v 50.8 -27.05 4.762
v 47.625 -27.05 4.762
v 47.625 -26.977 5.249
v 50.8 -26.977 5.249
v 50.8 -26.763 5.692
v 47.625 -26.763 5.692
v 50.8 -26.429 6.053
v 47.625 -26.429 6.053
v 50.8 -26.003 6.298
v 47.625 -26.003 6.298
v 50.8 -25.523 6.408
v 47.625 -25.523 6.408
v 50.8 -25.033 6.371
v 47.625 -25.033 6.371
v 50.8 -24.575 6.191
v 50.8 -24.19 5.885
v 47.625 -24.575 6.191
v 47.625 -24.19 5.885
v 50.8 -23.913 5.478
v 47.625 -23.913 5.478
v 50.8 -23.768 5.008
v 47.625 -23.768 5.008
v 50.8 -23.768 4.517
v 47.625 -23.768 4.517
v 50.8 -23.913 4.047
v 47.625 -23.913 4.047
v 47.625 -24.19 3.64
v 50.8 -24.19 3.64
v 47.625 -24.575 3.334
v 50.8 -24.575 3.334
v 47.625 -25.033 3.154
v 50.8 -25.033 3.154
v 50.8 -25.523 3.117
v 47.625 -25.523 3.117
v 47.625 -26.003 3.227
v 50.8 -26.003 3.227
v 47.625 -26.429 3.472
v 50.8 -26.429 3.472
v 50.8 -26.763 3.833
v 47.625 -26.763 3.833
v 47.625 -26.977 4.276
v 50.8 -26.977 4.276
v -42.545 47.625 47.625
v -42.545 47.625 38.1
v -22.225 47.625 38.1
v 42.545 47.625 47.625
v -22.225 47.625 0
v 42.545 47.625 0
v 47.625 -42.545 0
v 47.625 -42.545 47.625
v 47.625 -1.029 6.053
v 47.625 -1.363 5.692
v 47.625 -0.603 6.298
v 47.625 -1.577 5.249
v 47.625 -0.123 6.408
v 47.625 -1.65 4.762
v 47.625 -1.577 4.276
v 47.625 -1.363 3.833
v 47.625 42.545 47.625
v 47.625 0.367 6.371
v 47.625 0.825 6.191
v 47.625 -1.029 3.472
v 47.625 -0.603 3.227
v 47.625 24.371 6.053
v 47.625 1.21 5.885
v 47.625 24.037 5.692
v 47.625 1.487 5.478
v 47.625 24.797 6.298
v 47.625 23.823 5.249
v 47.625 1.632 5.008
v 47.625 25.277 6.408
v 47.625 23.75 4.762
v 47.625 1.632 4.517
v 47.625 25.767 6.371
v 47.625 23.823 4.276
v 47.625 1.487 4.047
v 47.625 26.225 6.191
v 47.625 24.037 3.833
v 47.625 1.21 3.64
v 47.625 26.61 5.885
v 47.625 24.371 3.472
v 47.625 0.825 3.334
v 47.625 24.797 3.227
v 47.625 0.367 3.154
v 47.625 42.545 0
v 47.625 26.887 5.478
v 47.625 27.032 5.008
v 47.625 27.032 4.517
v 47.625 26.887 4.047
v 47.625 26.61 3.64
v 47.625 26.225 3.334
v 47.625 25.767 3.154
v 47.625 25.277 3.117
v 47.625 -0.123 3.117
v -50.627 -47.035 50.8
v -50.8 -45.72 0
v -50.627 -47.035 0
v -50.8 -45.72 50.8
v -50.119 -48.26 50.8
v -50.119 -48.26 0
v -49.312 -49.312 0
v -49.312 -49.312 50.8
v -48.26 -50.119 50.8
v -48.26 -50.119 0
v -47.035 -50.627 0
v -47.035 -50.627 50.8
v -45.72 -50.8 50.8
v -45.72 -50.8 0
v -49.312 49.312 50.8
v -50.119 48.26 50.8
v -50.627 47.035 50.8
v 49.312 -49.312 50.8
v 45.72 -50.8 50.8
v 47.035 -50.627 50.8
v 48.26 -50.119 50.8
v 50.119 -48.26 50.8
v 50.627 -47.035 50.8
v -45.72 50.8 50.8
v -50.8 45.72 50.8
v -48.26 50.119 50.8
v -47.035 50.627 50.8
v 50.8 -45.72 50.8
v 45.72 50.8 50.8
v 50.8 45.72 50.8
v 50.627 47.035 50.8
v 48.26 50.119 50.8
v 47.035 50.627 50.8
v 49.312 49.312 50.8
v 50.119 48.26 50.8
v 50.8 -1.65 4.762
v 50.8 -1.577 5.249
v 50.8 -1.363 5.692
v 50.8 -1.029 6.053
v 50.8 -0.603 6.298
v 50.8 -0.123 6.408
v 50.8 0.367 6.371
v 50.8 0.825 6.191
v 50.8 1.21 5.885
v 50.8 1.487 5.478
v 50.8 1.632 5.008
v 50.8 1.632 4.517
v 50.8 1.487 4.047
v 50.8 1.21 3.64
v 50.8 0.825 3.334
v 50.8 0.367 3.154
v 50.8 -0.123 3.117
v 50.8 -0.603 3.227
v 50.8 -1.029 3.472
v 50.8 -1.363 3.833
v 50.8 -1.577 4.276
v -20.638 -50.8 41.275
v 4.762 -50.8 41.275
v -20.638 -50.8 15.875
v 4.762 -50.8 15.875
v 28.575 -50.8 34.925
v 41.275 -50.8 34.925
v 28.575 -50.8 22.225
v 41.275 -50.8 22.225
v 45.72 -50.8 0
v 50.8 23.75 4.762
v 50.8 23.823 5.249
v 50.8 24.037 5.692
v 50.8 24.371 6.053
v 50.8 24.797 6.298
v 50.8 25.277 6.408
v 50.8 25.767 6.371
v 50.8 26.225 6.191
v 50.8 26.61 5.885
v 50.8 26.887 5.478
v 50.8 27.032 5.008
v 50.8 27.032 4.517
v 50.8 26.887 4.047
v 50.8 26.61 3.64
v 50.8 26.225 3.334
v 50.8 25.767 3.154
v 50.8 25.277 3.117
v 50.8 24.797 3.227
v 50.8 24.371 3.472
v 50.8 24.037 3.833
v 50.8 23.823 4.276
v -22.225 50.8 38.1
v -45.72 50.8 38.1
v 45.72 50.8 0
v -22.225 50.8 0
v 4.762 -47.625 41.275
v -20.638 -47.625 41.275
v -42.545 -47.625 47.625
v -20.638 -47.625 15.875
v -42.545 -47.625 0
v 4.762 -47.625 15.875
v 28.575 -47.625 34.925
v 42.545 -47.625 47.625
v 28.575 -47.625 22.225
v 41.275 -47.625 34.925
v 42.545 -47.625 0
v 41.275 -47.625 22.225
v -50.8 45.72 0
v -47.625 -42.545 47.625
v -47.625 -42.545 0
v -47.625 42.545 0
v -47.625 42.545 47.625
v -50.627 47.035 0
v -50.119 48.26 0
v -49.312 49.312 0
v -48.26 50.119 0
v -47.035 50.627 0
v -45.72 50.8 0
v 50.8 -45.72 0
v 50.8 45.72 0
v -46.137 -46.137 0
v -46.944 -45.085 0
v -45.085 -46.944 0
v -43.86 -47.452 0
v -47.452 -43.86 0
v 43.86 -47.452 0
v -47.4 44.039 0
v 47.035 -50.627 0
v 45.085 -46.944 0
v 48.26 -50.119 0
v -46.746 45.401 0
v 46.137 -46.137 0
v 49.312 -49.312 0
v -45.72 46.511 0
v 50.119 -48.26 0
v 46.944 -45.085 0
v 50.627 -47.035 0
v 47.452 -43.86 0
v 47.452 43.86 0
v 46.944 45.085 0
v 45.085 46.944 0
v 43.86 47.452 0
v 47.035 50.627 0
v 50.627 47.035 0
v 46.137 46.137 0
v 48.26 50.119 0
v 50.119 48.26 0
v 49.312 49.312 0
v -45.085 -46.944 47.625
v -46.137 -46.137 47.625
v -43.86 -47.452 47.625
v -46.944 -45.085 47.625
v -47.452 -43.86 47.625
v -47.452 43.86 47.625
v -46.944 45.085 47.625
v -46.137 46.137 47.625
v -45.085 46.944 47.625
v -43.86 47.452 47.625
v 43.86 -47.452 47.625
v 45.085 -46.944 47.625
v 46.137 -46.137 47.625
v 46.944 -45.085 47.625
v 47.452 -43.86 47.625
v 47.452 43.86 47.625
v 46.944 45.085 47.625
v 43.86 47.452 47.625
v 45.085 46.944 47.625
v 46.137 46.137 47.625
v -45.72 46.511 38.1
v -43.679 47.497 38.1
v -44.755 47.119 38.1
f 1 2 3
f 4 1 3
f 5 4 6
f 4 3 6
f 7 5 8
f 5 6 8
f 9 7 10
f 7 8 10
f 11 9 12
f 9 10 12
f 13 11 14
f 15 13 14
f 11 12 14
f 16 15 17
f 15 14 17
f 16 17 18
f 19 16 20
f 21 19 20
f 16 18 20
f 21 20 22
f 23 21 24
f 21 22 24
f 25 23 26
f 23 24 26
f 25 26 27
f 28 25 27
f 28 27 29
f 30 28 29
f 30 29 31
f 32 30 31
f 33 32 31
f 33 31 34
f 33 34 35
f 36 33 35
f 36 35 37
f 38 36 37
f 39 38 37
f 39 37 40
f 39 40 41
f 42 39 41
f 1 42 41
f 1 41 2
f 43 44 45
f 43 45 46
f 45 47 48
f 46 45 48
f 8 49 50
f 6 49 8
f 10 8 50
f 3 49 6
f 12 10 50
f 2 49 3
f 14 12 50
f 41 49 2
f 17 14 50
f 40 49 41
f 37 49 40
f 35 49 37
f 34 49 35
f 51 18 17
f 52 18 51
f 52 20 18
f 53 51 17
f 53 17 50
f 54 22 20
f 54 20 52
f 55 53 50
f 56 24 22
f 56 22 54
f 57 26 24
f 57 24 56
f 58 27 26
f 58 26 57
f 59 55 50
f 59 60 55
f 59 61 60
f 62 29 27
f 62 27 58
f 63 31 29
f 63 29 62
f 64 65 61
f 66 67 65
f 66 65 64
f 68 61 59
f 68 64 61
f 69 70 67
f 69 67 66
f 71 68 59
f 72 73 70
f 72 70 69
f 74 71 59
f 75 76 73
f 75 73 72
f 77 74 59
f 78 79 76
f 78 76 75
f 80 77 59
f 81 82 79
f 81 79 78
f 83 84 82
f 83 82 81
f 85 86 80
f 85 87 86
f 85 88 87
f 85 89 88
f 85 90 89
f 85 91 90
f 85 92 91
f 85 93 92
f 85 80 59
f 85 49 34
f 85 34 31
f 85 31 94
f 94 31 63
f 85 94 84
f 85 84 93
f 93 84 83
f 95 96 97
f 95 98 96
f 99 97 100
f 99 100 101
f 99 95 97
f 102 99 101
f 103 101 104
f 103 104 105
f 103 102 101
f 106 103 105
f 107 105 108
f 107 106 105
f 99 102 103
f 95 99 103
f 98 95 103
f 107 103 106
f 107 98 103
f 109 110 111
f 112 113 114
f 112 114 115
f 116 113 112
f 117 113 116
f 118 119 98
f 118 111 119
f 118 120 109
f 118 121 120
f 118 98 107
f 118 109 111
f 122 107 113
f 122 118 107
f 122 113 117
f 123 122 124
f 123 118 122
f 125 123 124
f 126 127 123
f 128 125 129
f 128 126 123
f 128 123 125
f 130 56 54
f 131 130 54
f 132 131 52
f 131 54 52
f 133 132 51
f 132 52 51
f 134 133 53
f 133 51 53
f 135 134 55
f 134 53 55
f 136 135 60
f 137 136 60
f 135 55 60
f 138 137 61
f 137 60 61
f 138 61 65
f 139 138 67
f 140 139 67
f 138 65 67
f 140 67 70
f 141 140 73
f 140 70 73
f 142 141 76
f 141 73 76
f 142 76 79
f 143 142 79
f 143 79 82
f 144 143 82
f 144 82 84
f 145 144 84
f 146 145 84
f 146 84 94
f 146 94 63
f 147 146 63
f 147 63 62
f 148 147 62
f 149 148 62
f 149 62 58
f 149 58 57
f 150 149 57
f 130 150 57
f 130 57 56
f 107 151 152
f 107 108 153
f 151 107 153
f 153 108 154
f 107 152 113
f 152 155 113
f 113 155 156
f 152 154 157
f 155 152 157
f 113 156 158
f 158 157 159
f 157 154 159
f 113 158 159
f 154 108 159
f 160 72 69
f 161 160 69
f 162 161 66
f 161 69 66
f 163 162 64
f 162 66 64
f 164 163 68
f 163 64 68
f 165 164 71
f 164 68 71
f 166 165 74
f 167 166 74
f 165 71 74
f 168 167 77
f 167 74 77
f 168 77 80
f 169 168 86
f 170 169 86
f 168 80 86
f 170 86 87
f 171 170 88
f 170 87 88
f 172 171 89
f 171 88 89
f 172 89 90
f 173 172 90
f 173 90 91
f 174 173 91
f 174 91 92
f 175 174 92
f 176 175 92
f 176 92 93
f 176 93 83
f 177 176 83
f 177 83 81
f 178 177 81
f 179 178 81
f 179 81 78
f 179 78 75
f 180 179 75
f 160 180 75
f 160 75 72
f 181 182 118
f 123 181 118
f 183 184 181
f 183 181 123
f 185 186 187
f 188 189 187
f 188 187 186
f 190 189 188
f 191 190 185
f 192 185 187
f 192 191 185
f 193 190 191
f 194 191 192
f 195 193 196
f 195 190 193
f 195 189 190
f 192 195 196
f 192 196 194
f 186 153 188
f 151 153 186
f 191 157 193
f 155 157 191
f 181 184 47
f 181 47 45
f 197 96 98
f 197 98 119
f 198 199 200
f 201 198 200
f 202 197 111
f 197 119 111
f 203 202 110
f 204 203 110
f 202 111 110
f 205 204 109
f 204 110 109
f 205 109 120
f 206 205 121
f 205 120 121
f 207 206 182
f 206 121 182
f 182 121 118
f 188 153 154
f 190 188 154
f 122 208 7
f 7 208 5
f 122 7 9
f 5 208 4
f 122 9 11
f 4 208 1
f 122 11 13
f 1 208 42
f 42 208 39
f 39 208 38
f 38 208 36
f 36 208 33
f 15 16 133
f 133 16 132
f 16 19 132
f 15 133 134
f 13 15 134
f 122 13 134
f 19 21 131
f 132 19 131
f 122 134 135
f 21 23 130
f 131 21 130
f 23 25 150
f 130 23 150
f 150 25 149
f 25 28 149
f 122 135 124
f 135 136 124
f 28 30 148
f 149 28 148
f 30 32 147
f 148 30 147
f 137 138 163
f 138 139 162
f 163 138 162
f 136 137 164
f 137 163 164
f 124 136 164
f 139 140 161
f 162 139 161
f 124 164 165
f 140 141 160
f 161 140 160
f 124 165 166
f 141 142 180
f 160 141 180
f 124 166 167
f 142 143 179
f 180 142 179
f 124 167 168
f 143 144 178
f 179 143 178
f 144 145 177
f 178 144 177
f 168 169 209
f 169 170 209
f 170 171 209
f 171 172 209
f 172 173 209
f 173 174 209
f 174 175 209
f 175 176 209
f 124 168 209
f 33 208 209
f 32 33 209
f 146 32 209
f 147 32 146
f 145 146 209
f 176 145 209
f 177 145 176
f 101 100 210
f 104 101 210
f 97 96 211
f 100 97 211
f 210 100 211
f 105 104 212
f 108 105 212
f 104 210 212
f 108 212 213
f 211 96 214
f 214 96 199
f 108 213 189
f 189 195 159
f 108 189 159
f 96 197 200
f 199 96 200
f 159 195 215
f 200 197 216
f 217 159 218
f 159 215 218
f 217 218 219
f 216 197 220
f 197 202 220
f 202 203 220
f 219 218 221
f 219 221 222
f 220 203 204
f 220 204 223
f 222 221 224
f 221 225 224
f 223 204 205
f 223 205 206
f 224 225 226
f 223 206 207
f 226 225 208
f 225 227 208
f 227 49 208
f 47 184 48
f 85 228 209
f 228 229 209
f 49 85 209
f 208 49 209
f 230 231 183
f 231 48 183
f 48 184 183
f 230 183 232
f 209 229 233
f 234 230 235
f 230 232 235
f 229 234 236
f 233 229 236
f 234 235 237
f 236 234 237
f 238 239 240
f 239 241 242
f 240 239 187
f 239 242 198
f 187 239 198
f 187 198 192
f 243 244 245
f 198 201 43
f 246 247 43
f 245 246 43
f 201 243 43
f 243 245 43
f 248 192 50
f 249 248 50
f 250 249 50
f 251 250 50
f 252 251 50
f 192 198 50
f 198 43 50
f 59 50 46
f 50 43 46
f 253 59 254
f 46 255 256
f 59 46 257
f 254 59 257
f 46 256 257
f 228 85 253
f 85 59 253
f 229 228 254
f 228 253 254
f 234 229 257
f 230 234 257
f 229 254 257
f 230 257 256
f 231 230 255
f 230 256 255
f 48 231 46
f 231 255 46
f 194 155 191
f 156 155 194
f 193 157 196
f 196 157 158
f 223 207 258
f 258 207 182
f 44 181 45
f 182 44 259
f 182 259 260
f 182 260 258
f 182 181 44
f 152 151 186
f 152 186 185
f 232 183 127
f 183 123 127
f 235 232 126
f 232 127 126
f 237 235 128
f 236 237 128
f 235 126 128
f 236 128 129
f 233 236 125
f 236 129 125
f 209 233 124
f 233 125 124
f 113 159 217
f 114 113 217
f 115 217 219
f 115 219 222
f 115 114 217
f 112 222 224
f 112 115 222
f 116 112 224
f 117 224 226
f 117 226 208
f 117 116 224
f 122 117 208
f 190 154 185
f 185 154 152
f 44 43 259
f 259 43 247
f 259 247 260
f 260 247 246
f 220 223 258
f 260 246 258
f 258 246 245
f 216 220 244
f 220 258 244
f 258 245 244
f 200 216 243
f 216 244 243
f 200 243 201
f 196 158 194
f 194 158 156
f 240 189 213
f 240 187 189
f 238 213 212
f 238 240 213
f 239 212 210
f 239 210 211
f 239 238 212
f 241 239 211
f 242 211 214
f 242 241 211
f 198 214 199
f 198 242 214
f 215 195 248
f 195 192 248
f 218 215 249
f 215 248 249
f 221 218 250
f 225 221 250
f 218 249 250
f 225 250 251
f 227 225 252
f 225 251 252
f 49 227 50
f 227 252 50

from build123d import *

# Parameters (mm, degrees)
F0_W     = 101.6
F0_H     = 101.6
F0_W_2   = 95.25
F0_H_2   = 95.25
F1_DEPTH = 50.8
F2_DEPTH = 47.625
F3_R     = 5.08
F4_W     = 25.4
F4_H     = 25.4
F4_W_2   = 12.7
F4_H_2   = 12.7
F5_DEPTH = 5.08
F6_W     = 23.495
F6_H     = 38.1
F7_DEPTH = 25.4
F9_D     = 3.3
F9_DEPTH = 6.35
F9_TIP   = 0.9914200214


with BuildPart() as f1:
    # F0 (on Top) → F1 (new body)
    with BuildSketch(Plane.XY):
        Rectangle(F0_W, F0_H)
        Rectangle(F0_W_2, F0_H_2, mode=Mode.SUBTRACT)
        Rectangle(F0_W_2, F0_H_2)
    extrude(amount=F1_DEPTH)

    # F0 (on Top) → F2 (cut)
    with BuildSketch(Plane.XY):
        Rectangle(F0_W_2, F0_H_2)
    extrude(amount=F2_DEPTH, mode=Mode.SUBTRACT)

    # F3
    f3_edges = [f1.edges().sort_by_distance(p)[0] for p in [
        (50.8, -50.8, 25.4),
        (50.8, 50.8, 25.4),
        (-50.8, 50.8, 25.4),
        (-47.625, -47.625, 23.8125),
        (47.625, -47.625, 23.8125),
        (47.625, 47.625, 23.8125),
        (-47.625, 47.625, 23.8125),
        (-50.8, -50.8, 25.4),
    ]]
    fillet(f3_edges, radius=F3_R)

    # F4 (on face) → F5 (cut)
    with BuildSketch(Plane.XZ.offset(50.8)):
        with Locations((-7.9375, 28.575)):
            Rectangle(F4_W, F4_H)
        with Locations((34.925, 28.575)):
            Rectangle(F4_W_2, F4_H_2)
    extrude(amount=-F5_DEPTH, mode=Mode.SUBTRACT)

    # F6 (on face) → F7 (cut)
    with BuildSketch(Plane(origin=(0, 50.8, 0), x_dir=(-1, 0, 0), z_dir=(0, 1, 0))):
        with Locations((33.9725, 19.05)):
            Rectangle(F6_W, F6_H)
    extrude(amount=-F7_DEPTH, mode=Mode.SUBTRACT)

    # F9
    with Locations(Plane.YZ.offset(50.8)):
        with Locations((-25.4, 4.7625), (0, 4.7625), (25.4, 4.7625)):
            Hole(F9_D / 2, depth=F9_DEPTH)
            with Locations((0, 0, -(F9_DEPTH + F9_TIP / 2))):  # 118° drill point
                Cone(0, F9_D / 2, F9_TIP, mode=Mode.SUBTRACT)


solid = f1.part
